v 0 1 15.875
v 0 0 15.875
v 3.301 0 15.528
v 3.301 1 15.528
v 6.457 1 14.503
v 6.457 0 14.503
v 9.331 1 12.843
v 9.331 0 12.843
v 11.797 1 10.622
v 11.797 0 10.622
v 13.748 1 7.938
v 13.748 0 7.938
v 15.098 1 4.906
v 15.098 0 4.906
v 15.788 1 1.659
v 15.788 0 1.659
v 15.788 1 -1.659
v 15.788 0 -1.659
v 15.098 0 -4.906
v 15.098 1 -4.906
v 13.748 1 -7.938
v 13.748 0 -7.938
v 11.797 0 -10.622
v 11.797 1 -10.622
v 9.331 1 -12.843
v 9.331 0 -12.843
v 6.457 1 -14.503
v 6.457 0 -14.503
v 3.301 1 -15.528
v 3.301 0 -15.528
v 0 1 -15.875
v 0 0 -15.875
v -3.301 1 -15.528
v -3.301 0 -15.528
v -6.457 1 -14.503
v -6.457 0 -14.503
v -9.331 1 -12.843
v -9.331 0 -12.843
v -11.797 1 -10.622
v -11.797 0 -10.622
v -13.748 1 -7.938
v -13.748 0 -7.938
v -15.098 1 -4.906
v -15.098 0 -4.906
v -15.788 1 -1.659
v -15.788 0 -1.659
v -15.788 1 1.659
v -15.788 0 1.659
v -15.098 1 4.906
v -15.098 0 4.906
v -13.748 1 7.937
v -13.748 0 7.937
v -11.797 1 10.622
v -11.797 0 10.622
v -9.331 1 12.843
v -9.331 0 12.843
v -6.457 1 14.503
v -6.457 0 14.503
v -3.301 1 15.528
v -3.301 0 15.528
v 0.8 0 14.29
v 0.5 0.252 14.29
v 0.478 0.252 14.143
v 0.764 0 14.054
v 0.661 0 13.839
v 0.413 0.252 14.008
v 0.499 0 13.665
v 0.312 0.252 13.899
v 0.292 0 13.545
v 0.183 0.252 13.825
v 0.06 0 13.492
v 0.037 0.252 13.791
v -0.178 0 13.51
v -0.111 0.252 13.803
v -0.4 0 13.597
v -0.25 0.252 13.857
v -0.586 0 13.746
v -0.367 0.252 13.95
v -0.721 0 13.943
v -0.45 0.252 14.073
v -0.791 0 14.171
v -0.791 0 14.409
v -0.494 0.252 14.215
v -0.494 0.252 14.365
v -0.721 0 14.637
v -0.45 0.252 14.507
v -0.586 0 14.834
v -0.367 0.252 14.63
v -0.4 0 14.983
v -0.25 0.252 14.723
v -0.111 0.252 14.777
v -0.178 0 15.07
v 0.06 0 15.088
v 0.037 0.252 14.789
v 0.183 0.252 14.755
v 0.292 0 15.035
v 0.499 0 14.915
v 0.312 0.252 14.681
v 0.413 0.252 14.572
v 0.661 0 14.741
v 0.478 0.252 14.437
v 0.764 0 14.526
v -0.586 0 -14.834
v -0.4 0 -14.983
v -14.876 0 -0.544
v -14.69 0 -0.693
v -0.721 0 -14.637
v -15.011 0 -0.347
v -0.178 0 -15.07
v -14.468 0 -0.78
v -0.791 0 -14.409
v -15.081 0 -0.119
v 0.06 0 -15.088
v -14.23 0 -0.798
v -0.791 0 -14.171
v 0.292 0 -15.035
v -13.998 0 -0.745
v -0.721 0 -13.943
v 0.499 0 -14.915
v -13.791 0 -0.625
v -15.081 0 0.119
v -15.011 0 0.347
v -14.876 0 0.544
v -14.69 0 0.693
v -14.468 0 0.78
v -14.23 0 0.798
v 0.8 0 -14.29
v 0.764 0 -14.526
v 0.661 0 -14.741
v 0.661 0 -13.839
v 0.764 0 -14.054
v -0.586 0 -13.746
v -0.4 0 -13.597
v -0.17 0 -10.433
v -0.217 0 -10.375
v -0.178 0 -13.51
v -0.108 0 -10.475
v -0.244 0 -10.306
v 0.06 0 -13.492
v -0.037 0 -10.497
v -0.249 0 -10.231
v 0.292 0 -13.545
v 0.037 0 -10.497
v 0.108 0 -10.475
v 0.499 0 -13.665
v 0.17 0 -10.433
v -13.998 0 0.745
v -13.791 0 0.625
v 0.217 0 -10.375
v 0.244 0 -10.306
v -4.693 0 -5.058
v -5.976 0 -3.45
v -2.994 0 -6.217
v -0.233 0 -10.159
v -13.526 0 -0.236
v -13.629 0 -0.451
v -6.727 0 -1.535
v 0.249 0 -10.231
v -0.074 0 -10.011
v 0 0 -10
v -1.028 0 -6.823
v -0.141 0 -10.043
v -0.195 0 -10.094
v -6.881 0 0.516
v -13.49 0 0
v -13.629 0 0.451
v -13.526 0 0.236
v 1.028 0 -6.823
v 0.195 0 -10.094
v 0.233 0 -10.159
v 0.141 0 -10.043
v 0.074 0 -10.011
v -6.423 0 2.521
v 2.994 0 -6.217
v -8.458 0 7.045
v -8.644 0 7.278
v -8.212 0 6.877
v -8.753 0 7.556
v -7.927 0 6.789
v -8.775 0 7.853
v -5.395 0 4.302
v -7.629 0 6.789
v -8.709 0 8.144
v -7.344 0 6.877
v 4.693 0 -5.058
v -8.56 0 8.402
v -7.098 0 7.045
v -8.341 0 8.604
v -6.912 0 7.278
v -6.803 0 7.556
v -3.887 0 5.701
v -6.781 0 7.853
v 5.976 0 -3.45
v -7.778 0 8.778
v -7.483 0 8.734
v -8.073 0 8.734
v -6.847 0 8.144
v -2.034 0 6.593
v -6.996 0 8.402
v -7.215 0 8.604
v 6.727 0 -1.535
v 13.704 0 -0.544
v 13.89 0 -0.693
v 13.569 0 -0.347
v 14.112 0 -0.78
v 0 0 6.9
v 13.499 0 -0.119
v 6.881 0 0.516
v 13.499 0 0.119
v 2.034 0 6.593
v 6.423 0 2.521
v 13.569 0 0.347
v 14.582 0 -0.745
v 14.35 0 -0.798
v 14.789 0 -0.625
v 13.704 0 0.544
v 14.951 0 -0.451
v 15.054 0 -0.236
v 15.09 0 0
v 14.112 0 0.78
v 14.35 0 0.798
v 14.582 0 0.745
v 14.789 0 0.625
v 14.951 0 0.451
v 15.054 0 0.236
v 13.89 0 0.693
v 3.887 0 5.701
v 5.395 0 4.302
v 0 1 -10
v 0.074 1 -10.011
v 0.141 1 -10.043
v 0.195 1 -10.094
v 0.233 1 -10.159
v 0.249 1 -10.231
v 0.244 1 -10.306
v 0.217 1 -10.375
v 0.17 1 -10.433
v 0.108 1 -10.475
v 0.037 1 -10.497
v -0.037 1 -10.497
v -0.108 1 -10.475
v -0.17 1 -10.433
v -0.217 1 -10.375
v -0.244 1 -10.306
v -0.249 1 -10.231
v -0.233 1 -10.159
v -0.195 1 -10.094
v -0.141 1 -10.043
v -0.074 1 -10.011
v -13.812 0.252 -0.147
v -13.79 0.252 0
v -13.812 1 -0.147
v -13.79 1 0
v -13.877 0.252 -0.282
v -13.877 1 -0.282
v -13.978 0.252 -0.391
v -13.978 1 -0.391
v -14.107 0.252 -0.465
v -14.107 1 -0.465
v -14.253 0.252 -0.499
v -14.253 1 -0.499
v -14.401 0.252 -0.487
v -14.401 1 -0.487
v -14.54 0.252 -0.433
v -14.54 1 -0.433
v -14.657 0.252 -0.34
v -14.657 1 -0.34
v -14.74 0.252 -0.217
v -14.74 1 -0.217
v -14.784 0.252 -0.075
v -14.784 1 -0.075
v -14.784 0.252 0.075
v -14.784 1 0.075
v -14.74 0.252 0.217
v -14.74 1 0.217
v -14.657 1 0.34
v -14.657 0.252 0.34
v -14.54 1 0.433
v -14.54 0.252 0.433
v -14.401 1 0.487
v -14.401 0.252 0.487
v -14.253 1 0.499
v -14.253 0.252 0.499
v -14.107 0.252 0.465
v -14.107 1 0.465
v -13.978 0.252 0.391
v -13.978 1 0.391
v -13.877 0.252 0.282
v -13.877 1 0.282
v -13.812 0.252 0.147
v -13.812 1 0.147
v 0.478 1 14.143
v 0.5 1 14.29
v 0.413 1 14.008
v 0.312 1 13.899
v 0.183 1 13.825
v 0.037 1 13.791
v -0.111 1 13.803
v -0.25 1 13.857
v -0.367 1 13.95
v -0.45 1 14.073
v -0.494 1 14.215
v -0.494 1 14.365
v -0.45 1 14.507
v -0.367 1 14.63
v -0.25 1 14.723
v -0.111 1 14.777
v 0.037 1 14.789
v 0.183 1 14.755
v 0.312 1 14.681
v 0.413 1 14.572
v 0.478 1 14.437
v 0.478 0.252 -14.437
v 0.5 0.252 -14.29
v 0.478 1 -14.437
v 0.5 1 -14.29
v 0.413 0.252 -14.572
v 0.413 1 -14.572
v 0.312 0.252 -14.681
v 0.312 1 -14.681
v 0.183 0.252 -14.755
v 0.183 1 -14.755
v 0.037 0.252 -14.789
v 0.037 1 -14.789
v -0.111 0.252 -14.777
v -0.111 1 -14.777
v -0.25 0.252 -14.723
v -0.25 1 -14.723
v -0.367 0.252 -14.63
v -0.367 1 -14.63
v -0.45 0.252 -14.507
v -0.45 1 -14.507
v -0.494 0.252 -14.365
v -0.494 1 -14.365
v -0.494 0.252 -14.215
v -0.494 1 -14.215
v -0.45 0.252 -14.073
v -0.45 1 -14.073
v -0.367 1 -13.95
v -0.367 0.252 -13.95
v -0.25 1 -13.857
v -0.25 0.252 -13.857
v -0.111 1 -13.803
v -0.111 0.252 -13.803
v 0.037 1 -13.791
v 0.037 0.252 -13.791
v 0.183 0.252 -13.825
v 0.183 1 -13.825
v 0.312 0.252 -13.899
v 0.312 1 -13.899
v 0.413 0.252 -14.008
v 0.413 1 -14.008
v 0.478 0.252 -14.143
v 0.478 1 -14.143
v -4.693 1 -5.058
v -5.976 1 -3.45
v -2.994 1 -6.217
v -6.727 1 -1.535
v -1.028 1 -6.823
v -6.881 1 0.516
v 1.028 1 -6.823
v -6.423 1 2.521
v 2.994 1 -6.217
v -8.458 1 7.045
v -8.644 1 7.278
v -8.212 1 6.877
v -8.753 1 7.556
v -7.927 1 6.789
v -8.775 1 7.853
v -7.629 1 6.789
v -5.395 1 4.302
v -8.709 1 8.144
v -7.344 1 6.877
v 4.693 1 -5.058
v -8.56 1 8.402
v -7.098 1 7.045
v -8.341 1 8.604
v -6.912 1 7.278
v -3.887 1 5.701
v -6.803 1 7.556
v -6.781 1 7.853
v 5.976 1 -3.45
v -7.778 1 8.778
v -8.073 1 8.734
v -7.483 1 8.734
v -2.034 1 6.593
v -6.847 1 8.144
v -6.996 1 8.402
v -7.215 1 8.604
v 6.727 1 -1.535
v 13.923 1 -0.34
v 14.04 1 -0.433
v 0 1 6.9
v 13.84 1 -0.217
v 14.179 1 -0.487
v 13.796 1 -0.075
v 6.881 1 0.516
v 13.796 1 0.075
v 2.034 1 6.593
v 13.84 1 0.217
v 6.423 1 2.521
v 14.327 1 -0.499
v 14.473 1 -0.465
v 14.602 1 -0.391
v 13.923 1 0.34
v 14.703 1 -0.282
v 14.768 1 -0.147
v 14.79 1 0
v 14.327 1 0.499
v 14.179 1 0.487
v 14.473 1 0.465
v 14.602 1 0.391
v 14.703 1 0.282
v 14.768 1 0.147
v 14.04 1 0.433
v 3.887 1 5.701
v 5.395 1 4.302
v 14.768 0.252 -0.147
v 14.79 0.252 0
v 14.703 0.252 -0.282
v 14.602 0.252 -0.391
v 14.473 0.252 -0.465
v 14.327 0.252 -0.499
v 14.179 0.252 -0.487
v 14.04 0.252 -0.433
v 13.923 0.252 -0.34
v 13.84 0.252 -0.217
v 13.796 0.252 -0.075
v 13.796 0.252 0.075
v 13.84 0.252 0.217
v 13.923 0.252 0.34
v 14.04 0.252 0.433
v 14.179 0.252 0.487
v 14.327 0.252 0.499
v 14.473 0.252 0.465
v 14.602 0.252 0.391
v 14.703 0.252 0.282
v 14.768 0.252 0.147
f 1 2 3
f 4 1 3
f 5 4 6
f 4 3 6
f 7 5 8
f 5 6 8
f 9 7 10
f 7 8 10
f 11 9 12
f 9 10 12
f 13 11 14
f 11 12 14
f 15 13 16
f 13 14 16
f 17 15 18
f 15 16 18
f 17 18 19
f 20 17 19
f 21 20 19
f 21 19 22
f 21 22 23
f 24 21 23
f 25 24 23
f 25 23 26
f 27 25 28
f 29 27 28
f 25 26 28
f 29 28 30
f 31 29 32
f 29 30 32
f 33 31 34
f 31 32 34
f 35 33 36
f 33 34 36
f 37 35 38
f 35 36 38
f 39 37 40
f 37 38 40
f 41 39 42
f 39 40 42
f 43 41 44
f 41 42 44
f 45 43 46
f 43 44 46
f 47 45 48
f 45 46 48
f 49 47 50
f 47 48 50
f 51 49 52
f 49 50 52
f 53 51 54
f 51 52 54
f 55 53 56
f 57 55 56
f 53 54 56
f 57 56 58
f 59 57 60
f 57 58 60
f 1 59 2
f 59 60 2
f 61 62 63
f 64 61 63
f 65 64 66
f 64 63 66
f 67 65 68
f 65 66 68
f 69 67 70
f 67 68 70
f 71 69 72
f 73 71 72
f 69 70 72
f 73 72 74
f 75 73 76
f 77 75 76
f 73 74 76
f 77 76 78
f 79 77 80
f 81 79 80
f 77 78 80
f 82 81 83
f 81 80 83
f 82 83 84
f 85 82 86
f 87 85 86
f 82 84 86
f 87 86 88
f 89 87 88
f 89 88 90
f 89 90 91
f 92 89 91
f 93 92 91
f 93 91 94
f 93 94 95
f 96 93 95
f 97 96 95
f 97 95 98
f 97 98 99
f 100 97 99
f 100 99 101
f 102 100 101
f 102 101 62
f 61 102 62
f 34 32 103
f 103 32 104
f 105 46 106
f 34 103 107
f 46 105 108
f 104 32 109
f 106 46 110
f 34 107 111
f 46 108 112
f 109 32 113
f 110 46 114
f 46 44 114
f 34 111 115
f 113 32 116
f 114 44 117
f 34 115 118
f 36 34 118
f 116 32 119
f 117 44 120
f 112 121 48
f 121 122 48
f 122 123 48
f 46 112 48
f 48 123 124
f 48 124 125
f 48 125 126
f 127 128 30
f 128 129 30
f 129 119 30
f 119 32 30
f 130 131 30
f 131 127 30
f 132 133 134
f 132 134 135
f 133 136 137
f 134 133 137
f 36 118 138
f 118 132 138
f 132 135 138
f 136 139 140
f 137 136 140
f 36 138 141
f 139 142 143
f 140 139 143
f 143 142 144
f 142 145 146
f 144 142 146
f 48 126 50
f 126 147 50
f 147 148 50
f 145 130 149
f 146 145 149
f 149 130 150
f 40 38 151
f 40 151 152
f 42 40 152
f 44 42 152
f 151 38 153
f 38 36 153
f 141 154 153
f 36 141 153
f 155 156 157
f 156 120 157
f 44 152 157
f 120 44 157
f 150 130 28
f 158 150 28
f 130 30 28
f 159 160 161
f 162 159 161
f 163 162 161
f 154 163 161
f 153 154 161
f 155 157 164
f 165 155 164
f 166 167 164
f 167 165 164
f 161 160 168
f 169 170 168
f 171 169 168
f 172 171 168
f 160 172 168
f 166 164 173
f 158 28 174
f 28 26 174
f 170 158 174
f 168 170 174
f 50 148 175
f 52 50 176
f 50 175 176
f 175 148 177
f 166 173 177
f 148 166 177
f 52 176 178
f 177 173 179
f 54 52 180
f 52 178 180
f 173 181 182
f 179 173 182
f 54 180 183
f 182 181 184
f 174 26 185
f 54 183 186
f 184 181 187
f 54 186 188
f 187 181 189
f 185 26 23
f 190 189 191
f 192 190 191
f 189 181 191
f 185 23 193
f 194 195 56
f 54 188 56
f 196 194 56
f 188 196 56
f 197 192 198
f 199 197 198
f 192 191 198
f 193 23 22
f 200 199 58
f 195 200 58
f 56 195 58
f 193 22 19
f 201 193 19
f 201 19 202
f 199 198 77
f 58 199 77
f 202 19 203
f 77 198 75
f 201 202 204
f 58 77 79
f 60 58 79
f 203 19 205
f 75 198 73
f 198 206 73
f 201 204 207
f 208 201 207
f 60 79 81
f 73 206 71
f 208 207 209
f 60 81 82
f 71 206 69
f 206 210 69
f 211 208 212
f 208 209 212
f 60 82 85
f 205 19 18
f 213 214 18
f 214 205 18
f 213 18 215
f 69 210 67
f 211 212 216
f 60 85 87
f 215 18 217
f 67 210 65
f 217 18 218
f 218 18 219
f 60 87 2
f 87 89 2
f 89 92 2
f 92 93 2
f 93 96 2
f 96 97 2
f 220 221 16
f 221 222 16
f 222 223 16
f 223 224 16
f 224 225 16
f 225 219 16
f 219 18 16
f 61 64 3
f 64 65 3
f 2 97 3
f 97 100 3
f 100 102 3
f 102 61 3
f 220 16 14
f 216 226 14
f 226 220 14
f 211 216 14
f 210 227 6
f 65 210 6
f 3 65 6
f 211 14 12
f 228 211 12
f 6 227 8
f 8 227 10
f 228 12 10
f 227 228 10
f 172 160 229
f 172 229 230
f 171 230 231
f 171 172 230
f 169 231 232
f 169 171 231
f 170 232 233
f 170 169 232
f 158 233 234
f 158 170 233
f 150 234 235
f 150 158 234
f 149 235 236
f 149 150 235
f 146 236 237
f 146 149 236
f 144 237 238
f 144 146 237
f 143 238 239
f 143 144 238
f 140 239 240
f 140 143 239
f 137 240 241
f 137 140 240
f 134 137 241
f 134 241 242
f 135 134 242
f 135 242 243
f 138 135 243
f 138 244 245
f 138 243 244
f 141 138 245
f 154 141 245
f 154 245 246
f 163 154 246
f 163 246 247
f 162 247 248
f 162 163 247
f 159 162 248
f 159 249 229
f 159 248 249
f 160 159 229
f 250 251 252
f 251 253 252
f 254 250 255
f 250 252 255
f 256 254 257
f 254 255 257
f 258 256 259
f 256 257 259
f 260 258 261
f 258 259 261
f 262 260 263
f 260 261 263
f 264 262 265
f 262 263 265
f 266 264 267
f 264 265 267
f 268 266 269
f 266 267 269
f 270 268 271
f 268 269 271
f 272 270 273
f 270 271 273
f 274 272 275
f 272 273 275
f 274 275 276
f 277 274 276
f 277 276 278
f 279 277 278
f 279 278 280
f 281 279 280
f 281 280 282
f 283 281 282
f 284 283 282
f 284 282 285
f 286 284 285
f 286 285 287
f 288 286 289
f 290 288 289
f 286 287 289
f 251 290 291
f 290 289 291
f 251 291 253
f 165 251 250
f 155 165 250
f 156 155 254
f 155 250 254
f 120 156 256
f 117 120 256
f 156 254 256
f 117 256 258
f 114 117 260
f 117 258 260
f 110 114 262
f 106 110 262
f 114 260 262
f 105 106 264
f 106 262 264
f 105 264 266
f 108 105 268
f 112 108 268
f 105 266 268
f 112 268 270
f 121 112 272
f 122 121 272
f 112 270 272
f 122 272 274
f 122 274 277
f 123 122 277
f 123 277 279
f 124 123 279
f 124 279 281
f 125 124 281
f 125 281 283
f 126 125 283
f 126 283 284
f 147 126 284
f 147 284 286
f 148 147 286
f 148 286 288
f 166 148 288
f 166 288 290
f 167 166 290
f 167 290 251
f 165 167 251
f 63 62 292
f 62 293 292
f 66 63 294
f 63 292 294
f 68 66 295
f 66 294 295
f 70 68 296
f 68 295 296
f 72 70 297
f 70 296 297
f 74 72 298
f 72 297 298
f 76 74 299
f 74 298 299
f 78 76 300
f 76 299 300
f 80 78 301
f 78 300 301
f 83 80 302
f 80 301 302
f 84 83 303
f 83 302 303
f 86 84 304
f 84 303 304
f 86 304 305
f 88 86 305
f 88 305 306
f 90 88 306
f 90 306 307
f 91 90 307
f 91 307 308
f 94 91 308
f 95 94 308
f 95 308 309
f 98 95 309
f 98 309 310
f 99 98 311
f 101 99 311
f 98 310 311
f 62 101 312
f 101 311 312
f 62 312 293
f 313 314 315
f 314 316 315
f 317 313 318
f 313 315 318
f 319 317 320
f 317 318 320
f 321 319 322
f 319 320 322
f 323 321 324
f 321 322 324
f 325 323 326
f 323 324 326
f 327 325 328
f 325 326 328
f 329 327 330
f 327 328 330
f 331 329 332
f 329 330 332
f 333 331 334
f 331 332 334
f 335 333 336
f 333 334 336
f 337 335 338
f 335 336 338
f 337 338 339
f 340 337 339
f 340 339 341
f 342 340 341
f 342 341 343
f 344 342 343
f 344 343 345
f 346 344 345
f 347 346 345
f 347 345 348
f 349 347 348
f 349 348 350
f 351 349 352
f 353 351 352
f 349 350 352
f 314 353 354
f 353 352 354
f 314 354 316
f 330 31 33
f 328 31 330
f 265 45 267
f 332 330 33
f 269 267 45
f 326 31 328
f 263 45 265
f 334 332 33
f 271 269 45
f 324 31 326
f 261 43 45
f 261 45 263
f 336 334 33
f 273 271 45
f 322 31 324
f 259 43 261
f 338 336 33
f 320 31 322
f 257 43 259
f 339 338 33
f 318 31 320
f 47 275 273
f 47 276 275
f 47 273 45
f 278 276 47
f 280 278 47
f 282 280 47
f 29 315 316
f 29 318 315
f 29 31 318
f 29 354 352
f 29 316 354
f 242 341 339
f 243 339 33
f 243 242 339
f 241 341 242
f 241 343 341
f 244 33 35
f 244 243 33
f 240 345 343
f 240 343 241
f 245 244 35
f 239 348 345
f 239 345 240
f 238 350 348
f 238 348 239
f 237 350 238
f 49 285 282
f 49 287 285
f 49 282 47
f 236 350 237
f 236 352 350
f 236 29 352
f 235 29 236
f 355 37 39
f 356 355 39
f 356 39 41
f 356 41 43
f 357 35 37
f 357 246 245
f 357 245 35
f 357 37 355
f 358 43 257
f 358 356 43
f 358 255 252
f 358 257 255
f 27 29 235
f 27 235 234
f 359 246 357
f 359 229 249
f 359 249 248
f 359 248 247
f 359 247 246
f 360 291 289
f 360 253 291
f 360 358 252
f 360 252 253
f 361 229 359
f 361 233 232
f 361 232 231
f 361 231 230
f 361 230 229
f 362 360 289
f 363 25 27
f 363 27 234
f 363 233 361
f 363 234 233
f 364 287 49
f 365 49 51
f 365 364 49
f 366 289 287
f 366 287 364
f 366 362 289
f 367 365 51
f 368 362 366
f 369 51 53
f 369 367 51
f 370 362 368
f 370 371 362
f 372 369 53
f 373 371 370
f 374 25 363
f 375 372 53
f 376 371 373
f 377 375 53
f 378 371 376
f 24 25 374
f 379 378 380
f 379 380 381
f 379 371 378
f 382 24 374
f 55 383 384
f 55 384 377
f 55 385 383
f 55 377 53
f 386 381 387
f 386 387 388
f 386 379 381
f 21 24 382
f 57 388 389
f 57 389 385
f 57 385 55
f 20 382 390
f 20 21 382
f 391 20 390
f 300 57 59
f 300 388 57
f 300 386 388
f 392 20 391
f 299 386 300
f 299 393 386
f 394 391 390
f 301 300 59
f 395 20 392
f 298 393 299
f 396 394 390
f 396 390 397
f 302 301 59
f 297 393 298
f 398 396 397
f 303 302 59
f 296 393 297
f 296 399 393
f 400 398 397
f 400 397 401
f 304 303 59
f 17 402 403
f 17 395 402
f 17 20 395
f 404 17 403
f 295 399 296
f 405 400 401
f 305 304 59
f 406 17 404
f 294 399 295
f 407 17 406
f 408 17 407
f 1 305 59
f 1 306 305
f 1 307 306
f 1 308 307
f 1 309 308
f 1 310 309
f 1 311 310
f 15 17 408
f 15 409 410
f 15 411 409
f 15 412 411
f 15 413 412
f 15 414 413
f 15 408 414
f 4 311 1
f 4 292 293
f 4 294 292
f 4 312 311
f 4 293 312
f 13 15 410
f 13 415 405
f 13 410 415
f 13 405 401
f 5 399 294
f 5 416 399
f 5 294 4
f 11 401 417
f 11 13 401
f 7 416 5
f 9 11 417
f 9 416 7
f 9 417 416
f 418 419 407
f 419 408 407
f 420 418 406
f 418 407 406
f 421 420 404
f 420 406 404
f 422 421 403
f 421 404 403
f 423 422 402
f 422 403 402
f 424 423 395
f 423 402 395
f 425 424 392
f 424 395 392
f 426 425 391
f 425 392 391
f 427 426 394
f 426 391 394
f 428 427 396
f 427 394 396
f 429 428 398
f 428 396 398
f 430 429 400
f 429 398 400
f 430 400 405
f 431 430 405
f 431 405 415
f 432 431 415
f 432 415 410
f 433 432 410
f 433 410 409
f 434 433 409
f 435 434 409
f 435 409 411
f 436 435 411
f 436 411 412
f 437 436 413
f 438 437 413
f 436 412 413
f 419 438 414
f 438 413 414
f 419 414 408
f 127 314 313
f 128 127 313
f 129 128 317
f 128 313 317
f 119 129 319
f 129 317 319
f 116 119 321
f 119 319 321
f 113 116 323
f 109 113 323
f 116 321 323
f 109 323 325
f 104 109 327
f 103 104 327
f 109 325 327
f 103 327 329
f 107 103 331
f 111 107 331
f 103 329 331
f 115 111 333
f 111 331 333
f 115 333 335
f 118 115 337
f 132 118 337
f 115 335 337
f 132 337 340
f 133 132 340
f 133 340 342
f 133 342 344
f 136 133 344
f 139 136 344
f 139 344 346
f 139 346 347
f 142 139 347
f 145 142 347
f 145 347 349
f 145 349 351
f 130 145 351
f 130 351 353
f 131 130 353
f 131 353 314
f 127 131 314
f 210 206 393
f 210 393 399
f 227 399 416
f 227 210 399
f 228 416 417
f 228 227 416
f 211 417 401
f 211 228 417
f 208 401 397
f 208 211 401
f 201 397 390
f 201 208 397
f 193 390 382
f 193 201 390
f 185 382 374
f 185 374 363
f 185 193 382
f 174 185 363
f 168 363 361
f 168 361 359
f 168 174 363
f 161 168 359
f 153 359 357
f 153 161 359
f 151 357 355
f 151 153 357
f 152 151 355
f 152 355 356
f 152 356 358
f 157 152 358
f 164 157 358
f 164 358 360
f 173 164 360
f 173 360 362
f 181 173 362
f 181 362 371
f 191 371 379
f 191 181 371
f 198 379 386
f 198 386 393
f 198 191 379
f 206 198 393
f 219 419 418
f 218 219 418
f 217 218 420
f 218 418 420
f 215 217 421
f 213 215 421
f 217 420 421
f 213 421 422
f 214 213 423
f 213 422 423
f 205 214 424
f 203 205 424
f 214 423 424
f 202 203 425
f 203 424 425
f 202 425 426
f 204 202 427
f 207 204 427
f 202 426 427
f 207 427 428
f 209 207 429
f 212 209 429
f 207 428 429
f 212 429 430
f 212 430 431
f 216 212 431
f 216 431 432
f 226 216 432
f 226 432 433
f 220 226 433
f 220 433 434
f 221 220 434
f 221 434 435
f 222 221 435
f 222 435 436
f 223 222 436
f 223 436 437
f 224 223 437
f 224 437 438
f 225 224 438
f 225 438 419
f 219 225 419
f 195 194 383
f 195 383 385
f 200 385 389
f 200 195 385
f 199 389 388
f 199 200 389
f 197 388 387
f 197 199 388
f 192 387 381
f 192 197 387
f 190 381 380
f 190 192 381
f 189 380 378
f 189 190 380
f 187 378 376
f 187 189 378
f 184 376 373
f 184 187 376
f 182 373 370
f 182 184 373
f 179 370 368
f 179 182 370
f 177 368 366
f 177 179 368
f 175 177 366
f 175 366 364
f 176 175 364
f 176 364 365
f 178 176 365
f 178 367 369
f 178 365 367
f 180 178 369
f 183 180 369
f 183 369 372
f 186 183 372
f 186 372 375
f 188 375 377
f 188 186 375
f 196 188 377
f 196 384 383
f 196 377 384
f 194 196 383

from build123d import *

# Parameters (mm, degrees)
SKETCH1_R                                       = 15.875
SKETCH1_R_2                                     = 6.9
BOSS_EXTRUDE1_DEPTH                             = 1
CSK_FOR_M2_FLAT_HEAD_MACHINE_SCREW1_D           = 1
CSK_FOR_M2_FLAT_HEAD_MACHINE_SCREW1_CSINK_D     = 1.6
CSK_FOR_M2_FLAT_HEAD_MACHINE_SCREW1_CSINK_ANGLE = 100
CUT_EXTRUDE1_DEPTH                              = 23.472900347
CUT_EXTRUDE1_DEPTH_BACK                         = 23.472900347
SKETCH4_R                                       = 0.25
SKETCH4_R_2                                     = 1


with BuildPart() as part:
    # Sketch1 → Boss-Extrude1 (new body)
    with BuildSketch(Plane(origin=(0, 0, 0), x_dir=(1, 0, 0), z_dir=(0, 1, 0))):
        with Locations(Location((0, 0, 0), (0, 0, 270))):
            Circle(SKETCH1_R)
        with Locations(Location((0, 0, 0), (0, 0, 270))):
            Circle(SKETCH1_R_2, mode=Mode.SUBTRACT)
    extrude(amount=BOSS_EXTRUDE1_DEPTH)

    # CSK for M2 Flat Head Machine Screw1 (through all)
    with Locations(Plane(origin=(0, 0, 0), x_dir=(-1, 0, 0), z_dir=(0, -1, 0))):
        with Locations((0, -14.29), (-14.29, 0), (0, 14.29), (14.29, 0)):
            CounterSinkHole(CSK_FOR_M2_FLAT_HEAD_MACHINE_SCREW1_D / 2, CSK_FOR_M2_FLAT_HEAD_MACHINE_SCREW1_CSINK_D / 2, counter_sink_angle=CSK_FOR_M2_FLAT_HEAD_MACHINE_SCREW1_CSINK_ANGLE)

    # Sketch4 → Cut-Extrude1 (cut, two sides: drawn at the far end of the back side and taken through both)
    with BuildSketch(Plane(origin=(0, 1, 0), x_dir=(1, 0, 0), z_dir=(0, 1, 0)).offset(-CUT_EXTRUDE1_DEPTH_BACK)):
        with Locations(Location((0, 10.25, 0), (0, 0, 270))):
            Circle(SKETCH4_R)
        with Locations(Location((-7.778174593, -7.778174593, 0), (0, 0, 270))):
            Circle(SKETCH4_R_2)
    extrude(amount=CUT_EXTRUDE1_DEPTH + CUT_EXTRUDE1_DEPTH_BACK, mode=Mode.SUBTRACT)


solid = part.part
